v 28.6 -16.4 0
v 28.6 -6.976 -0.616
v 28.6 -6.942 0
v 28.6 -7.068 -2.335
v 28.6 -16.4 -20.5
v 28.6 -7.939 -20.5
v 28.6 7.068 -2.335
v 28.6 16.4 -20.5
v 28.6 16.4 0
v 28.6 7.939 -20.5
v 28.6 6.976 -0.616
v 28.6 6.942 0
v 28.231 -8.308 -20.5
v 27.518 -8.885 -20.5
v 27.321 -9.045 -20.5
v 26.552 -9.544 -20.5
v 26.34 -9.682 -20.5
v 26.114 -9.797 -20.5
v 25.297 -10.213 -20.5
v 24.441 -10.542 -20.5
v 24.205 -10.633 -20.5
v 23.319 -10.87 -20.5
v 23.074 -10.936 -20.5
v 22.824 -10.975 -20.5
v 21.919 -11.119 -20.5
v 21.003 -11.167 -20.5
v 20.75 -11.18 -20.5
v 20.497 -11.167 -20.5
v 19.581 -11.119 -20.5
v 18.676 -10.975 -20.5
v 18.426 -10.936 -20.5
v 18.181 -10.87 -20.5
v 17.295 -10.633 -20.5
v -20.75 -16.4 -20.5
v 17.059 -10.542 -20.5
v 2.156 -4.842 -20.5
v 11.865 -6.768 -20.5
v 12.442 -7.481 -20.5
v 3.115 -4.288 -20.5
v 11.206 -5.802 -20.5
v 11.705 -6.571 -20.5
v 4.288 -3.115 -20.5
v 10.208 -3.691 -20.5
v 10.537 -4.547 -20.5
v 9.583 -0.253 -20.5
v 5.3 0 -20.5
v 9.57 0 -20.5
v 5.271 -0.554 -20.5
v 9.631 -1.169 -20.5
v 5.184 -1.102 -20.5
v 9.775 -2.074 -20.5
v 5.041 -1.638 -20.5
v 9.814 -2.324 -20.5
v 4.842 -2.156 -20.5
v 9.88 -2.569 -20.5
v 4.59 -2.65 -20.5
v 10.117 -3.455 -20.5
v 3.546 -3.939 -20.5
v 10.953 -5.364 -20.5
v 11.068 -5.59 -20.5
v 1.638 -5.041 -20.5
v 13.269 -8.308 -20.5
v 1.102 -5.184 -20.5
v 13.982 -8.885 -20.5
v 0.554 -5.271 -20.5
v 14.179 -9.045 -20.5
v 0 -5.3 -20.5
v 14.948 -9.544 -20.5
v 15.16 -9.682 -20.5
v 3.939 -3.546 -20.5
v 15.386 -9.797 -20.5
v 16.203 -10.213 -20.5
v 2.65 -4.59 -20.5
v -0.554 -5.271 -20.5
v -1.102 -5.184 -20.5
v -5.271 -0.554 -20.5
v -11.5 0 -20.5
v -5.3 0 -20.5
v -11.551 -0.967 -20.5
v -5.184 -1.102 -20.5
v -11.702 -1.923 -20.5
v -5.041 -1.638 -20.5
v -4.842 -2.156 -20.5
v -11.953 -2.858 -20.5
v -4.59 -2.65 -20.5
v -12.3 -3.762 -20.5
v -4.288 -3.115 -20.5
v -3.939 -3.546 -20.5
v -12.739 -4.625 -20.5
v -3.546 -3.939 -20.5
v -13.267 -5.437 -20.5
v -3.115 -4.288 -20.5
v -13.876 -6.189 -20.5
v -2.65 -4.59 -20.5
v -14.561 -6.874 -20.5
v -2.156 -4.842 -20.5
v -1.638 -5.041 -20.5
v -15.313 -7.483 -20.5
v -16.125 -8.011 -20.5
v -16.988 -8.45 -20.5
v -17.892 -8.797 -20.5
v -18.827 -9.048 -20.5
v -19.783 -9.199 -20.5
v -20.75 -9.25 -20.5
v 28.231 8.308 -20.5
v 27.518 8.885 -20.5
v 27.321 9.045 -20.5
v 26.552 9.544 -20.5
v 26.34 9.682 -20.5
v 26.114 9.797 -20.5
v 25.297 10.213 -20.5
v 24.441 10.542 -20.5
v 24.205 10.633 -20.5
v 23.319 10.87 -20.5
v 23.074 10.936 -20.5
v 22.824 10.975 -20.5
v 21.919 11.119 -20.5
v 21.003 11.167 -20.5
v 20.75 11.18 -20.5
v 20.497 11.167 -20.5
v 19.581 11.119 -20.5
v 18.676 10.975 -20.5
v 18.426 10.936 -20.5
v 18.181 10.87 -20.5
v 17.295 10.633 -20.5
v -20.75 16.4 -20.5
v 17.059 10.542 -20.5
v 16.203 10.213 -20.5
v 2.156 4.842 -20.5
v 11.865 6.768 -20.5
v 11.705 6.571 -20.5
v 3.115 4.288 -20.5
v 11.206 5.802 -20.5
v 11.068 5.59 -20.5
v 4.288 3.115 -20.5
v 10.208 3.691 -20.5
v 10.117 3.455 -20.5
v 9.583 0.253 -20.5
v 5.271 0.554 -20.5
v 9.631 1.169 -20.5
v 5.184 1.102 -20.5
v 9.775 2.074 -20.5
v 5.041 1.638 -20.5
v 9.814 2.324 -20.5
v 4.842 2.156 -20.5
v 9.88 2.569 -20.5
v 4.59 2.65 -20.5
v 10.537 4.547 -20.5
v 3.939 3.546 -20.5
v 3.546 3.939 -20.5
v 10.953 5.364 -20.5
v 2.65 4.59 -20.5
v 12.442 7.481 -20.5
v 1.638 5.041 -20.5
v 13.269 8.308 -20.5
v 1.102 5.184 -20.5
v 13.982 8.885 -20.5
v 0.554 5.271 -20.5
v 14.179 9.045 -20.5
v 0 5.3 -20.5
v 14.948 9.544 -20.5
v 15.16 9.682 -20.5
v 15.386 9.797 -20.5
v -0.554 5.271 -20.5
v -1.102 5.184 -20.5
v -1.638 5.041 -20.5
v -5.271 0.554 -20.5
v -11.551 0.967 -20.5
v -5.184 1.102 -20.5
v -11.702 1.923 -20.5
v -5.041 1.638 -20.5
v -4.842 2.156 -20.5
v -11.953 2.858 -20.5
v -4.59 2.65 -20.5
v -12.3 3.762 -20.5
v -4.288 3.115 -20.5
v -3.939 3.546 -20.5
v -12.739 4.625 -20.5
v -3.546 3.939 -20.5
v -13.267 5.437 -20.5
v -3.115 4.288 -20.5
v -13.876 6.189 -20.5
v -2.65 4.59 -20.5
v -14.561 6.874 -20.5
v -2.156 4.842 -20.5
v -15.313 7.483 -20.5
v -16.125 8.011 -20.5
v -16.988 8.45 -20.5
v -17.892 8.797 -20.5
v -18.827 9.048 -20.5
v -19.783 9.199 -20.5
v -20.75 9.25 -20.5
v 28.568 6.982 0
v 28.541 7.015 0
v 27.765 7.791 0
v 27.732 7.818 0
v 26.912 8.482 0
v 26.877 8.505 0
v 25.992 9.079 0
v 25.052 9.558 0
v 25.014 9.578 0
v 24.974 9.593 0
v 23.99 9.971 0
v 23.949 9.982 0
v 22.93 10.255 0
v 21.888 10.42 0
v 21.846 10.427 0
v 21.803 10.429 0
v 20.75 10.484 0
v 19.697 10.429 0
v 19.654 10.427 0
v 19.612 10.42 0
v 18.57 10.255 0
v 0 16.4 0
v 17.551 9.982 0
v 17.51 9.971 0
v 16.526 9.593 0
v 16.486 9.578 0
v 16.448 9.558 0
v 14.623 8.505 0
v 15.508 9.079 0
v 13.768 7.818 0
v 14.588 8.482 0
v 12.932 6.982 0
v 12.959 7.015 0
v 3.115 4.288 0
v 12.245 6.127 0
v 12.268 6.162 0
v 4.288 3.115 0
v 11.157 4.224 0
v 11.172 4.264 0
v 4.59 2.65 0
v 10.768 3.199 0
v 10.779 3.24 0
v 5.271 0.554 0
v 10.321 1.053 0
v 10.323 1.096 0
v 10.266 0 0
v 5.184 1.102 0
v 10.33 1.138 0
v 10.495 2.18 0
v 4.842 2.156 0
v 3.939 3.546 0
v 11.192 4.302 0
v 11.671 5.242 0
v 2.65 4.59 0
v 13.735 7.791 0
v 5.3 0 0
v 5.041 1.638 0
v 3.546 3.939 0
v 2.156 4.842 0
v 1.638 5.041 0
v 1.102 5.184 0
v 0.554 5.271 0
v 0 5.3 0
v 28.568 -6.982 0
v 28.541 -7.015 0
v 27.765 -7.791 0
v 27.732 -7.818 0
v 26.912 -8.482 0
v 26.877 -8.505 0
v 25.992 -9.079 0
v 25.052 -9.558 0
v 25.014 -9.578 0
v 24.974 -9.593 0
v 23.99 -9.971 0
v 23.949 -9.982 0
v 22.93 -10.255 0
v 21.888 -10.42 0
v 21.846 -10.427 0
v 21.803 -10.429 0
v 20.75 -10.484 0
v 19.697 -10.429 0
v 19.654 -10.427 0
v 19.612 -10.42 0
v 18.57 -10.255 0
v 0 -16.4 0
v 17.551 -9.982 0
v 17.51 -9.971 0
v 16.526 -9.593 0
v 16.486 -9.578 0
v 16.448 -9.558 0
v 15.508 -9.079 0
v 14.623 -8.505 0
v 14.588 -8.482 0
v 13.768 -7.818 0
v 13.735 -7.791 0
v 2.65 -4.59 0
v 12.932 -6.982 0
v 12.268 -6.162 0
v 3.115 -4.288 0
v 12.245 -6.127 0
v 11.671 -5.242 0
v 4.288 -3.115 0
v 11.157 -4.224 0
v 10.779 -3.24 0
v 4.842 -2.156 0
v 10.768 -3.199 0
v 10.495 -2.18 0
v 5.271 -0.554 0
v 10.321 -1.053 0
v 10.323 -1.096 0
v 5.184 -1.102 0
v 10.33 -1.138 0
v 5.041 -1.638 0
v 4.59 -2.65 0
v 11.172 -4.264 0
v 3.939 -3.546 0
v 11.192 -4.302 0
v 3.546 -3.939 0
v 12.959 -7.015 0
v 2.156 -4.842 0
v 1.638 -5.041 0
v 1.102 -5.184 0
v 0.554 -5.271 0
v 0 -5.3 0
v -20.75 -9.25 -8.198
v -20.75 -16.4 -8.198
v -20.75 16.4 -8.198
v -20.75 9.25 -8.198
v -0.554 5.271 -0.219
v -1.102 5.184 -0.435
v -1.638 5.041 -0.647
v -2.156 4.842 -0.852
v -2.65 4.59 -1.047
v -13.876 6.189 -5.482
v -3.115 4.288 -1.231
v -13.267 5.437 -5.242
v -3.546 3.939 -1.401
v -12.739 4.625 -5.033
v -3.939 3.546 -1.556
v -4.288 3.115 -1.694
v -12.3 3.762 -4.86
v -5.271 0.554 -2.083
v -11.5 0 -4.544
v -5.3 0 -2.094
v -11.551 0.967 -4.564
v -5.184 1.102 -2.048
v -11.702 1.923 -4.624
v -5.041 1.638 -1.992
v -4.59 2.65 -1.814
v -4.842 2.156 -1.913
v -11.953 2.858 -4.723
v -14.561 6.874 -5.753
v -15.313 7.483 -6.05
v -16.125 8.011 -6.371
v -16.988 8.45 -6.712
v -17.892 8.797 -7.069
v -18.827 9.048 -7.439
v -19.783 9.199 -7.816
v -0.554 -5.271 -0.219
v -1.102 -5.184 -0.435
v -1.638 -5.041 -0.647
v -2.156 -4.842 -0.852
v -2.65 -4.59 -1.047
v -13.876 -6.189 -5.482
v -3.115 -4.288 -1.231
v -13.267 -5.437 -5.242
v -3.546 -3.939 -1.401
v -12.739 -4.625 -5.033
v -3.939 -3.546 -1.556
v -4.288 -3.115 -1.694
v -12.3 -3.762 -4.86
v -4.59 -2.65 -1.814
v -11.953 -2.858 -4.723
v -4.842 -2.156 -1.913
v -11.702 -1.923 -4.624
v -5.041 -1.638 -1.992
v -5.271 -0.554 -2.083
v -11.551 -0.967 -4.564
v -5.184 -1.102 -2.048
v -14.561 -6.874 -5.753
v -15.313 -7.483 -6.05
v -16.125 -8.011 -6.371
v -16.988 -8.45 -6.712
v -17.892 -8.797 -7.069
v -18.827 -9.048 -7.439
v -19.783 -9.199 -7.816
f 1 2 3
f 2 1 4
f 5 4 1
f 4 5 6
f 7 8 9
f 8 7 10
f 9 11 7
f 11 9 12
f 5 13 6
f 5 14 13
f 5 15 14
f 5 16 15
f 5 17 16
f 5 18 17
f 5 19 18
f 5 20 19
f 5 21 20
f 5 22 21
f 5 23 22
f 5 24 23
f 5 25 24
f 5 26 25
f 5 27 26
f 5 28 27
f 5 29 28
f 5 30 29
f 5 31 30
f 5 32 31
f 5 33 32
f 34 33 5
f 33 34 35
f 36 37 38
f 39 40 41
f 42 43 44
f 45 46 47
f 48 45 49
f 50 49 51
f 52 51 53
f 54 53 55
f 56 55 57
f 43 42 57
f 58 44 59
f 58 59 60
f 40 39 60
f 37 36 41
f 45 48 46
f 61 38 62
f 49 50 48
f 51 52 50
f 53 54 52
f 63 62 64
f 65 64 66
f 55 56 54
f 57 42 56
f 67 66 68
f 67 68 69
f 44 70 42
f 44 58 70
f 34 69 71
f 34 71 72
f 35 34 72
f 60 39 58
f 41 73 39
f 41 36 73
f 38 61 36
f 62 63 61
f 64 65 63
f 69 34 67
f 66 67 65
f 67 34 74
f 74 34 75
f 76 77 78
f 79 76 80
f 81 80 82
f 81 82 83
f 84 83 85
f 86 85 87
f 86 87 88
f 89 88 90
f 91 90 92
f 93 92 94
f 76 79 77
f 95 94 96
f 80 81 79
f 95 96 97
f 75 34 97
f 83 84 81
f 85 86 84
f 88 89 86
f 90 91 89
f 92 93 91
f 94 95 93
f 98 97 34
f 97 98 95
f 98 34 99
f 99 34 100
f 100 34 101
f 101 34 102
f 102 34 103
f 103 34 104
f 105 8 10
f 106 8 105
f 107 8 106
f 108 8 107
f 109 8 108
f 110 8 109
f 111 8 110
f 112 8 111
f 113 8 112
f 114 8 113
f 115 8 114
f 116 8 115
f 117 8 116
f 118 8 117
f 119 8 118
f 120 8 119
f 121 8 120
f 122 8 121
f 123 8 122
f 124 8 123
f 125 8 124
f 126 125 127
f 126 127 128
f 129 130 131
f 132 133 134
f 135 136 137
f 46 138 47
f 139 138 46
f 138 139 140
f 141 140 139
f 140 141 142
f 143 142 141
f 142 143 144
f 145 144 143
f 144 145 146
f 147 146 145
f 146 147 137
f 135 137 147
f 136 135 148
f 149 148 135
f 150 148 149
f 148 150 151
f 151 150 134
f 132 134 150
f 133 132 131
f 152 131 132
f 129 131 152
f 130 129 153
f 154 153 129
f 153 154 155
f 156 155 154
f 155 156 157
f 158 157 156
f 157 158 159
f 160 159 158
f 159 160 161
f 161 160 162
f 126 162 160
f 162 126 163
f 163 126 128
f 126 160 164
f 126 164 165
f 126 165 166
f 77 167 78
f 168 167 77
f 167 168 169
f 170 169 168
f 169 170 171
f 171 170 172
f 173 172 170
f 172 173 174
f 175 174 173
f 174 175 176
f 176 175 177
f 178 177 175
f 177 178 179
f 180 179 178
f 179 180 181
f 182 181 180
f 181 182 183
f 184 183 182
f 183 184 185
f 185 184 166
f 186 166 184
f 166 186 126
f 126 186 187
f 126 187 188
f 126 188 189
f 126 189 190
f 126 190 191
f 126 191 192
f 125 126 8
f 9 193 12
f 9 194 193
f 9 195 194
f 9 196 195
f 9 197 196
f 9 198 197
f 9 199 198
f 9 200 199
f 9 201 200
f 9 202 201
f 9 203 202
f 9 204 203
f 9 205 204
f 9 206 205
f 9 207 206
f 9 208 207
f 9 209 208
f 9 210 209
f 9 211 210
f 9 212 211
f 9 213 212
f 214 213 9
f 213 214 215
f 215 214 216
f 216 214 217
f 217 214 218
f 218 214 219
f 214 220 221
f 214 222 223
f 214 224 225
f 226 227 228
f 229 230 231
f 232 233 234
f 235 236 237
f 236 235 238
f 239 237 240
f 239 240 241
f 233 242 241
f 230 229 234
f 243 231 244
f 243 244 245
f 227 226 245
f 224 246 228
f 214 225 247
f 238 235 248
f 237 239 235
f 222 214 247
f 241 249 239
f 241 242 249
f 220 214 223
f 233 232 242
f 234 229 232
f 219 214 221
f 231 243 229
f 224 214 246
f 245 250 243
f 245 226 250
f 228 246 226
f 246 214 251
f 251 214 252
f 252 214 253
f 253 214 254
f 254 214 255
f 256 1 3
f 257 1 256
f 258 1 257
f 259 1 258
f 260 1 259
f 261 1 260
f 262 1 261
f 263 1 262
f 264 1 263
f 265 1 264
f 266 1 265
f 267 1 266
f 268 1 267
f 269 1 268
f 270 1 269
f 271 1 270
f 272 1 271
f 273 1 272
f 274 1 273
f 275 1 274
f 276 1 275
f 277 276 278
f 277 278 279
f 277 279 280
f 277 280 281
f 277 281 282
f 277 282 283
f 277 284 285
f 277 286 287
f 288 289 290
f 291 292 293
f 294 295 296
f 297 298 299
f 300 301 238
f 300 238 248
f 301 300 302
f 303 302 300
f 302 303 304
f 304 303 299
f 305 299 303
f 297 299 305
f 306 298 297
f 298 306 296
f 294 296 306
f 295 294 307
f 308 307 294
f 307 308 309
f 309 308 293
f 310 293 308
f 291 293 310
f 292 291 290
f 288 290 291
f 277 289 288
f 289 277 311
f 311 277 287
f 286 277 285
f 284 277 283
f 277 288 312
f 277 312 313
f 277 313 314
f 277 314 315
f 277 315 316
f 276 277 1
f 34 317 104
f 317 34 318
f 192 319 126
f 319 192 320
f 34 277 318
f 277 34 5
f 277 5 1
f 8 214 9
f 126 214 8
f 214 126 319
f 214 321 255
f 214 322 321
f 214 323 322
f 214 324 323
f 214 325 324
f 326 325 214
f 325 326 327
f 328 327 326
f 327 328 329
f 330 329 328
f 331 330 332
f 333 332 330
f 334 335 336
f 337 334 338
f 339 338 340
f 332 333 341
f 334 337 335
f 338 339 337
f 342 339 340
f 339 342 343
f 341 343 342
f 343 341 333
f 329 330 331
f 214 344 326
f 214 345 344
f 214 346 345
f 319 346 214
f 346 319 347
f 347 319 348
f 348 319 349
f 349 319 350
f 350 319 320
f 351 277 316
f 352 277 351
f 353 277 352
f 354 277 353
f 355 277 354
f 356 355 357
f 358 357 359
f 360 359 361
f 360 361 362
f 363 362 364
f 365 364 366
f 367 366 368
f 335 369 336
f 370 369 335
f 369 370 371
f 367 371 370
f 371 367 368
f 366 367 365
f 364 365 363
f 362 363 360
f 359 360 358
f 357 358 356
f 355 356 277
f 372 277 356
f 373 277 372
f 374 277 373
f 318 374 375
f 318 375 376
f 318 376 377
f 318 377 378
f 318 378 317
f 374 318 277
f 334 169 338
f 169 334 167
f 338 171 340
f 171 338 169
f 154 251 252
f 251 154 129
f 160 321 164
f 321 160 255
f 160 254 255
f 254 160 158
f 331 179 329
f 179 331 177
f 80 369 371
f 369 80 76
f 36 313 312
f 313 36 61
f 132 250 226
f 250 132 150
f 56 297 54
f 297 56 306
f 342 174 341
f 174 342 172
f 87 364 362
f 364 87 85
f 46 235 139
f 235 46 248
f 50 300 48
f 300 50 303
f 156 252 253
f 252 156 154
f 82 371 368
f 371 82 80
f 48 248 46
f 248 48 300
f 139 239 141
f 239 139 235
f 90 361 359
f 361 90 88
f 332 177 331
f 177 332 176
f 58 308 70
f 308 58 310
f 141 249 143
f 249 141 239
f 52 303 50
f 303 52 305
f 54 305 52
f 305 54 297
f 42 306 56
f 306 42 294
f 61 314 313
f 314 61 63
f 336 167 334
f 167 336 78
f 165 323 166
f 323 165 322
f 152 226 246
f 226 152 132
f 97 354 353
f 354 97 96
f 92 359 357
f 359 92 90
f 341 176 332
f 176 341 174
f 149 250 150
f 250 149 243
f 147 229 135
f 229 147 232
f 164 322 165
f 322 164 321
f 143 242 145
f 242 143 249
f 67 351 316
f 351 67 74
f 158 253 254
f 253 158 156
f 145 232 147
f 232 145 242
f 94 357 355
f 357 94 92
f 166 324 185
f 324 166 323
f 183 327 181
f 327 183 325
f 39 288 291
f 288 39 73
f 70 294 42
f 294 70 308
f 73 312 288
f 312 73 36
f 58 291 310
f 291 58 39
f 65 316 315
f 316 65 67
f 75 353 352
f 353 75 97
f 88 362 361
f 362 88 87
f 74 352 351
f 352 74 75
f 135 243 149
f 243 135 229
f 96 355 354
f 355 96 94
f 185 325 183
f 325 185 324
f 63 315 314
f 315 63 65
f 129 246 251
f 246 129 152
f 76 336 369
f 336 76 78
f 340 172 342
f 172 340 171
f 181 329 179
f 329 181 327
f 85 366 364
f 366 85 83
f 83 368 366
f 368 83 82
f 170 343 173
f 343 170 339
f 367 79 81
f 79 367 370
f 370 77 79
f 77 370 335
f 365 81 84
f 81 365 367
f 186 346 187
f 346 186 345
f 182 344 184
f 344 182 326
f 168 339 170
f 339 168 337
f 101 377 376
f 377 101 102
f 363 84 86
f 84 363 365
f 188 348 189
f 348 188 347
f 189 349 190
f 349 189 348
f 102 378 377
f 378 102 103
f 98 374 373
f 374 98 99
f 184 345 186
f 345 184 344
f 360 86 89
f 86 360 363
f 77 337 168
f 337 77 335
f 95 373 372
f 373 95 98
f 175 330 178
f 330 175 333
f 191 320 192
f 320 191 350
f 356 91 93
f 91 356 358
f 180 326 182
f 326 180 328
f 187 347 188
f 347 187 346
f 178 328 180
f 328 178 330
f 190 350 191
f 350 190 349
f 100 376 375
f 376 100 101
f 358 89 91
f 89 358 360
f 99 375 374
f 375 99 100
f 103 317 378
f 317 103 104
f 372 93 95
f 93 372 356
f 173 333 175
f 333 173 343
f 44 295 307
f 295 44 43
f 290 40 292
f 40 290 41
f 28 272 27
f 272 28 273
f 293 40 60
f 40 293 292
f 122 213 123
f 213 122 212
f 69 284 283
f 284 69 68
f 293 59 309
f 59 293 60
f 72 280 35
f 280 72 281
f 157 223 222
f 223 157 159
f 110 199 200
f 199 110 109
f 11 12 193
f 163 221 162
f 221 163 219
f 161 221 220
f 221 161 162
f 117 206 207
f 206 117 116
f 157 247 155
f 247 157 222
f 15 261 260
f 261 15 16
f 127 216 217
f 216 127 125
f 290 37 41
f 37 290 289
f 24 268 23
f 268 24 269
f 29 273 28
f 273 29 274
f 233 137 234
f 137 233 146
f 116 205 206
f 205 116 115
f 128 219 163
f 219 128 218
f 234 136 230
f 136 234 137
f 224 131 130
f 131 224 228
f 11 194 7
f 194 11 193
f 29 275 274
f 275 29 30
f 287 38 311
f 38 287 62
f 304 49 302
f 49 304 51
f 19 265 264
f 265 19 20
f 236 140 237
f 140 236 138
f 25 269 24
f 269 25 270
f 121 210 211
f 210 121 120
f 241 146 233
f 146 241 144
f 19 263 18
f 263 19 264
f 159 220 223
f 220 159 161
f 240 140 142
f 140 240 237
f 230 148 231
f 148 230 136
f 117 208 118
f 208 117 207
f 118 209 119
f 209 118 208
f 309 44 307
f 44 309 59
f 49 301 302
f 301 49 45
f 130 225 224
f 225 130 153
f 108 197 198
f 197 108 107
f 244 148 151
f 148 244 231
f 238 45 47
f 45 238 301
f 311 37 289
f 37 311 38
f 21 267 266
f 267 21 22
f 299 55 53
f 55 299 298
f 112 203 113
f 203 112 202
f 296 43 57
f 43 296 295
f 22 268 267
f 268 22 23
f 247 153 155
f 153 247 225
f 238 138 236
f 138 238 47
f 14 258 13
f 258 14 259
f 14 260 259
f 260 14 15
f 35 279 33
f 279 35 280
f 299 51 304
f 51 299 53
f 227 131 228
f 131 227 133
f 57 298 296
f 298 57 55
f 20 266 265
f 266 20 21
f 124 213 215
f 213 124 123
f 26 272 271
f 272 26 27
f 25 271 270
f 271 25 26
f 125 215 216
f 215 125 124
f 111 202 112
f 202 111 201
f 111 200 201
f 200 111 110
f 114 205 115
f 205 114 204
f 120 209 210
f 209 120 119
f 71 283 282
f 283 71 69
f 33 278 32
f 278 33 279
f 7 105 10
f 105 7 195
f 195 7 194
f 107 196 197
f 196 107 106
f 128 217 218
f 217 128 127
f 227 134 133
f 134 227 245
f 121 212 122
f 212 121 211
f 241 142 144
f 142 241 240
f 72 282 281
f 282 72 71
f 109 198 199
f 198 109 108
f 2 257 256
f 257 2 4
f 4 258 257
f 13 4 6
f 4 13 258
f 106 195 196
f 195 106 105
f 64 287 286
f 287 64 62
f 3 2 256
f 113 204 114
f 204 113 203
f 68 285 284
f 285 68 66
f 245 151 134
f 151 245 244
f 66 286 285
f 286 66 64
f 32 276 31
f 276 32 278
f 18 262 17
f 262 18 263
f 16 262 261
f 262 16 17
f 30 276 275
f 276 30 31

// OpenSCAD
$fn=60;

slop = 0.4;
rod_radius = 18.3/2 + slop - 0.3;
post_radius = 10.2/2 + slop/2 ; 
rod_post_spacing = 6.2 + slop - 0.4;

showerhead_upper_radius = 22.8/2 ; 
showerhead_lower_radius = 20.9/2 ; 
showerhead_slope_len = 28.0;

showerhead_taper = showerhead_upper_radius - showerhead_lower_radius;
showerhead_height = sqrt(showerhead_slope_len*showerhead_slope_len - showerhead_taper*showerhead_taper);

height_at_rod = 18.2 - 5 - 4;
height_at_post = 25.5 - 5;

wall = 5;

total_x = rod_radius + 2*post_radius + 2*rod_post_spacing + 1.5*showerhead_upper_radius;
total_y = 2*(wall + showerhead_upper_radius);
total_z = height_at_post;

block_taper_x = total_x -(rod_radius + rod_post_spacing + post_radius);
block_taper_y = height_at_post - height_at_rod;
taper_angle = atan2(block_taper_y, block_taper_x);

module showerblock_raw(){
    difference(){
        translate([-(rod_radius + rod_post_spacing + post_radius), -total_y/2, 0])
        cube([total_x, total_y, total_z]);

        rotate([0, taper_angle, 0])
        translate([-50,-50,-20])
        cube([100, 100, 20]);
    }
}


rotate([180,0,0])
difference() {
    color("blue")
    showerblock_raw();
    cylinder(r=post_radius, h = 60, center=true);
    
    translate([-(post_radius + rod_radius + rod_post_spacing),0,0])
    cylinder(r=rod_radius, h=60, center=true);
    
    translate([(post_radius + rod_radius + rod_post_spacing),0,-1])
    cylinder(r1=showerhead_lower_radius,r2=showerhead_upper_radius,h=showerhead_height);
}
